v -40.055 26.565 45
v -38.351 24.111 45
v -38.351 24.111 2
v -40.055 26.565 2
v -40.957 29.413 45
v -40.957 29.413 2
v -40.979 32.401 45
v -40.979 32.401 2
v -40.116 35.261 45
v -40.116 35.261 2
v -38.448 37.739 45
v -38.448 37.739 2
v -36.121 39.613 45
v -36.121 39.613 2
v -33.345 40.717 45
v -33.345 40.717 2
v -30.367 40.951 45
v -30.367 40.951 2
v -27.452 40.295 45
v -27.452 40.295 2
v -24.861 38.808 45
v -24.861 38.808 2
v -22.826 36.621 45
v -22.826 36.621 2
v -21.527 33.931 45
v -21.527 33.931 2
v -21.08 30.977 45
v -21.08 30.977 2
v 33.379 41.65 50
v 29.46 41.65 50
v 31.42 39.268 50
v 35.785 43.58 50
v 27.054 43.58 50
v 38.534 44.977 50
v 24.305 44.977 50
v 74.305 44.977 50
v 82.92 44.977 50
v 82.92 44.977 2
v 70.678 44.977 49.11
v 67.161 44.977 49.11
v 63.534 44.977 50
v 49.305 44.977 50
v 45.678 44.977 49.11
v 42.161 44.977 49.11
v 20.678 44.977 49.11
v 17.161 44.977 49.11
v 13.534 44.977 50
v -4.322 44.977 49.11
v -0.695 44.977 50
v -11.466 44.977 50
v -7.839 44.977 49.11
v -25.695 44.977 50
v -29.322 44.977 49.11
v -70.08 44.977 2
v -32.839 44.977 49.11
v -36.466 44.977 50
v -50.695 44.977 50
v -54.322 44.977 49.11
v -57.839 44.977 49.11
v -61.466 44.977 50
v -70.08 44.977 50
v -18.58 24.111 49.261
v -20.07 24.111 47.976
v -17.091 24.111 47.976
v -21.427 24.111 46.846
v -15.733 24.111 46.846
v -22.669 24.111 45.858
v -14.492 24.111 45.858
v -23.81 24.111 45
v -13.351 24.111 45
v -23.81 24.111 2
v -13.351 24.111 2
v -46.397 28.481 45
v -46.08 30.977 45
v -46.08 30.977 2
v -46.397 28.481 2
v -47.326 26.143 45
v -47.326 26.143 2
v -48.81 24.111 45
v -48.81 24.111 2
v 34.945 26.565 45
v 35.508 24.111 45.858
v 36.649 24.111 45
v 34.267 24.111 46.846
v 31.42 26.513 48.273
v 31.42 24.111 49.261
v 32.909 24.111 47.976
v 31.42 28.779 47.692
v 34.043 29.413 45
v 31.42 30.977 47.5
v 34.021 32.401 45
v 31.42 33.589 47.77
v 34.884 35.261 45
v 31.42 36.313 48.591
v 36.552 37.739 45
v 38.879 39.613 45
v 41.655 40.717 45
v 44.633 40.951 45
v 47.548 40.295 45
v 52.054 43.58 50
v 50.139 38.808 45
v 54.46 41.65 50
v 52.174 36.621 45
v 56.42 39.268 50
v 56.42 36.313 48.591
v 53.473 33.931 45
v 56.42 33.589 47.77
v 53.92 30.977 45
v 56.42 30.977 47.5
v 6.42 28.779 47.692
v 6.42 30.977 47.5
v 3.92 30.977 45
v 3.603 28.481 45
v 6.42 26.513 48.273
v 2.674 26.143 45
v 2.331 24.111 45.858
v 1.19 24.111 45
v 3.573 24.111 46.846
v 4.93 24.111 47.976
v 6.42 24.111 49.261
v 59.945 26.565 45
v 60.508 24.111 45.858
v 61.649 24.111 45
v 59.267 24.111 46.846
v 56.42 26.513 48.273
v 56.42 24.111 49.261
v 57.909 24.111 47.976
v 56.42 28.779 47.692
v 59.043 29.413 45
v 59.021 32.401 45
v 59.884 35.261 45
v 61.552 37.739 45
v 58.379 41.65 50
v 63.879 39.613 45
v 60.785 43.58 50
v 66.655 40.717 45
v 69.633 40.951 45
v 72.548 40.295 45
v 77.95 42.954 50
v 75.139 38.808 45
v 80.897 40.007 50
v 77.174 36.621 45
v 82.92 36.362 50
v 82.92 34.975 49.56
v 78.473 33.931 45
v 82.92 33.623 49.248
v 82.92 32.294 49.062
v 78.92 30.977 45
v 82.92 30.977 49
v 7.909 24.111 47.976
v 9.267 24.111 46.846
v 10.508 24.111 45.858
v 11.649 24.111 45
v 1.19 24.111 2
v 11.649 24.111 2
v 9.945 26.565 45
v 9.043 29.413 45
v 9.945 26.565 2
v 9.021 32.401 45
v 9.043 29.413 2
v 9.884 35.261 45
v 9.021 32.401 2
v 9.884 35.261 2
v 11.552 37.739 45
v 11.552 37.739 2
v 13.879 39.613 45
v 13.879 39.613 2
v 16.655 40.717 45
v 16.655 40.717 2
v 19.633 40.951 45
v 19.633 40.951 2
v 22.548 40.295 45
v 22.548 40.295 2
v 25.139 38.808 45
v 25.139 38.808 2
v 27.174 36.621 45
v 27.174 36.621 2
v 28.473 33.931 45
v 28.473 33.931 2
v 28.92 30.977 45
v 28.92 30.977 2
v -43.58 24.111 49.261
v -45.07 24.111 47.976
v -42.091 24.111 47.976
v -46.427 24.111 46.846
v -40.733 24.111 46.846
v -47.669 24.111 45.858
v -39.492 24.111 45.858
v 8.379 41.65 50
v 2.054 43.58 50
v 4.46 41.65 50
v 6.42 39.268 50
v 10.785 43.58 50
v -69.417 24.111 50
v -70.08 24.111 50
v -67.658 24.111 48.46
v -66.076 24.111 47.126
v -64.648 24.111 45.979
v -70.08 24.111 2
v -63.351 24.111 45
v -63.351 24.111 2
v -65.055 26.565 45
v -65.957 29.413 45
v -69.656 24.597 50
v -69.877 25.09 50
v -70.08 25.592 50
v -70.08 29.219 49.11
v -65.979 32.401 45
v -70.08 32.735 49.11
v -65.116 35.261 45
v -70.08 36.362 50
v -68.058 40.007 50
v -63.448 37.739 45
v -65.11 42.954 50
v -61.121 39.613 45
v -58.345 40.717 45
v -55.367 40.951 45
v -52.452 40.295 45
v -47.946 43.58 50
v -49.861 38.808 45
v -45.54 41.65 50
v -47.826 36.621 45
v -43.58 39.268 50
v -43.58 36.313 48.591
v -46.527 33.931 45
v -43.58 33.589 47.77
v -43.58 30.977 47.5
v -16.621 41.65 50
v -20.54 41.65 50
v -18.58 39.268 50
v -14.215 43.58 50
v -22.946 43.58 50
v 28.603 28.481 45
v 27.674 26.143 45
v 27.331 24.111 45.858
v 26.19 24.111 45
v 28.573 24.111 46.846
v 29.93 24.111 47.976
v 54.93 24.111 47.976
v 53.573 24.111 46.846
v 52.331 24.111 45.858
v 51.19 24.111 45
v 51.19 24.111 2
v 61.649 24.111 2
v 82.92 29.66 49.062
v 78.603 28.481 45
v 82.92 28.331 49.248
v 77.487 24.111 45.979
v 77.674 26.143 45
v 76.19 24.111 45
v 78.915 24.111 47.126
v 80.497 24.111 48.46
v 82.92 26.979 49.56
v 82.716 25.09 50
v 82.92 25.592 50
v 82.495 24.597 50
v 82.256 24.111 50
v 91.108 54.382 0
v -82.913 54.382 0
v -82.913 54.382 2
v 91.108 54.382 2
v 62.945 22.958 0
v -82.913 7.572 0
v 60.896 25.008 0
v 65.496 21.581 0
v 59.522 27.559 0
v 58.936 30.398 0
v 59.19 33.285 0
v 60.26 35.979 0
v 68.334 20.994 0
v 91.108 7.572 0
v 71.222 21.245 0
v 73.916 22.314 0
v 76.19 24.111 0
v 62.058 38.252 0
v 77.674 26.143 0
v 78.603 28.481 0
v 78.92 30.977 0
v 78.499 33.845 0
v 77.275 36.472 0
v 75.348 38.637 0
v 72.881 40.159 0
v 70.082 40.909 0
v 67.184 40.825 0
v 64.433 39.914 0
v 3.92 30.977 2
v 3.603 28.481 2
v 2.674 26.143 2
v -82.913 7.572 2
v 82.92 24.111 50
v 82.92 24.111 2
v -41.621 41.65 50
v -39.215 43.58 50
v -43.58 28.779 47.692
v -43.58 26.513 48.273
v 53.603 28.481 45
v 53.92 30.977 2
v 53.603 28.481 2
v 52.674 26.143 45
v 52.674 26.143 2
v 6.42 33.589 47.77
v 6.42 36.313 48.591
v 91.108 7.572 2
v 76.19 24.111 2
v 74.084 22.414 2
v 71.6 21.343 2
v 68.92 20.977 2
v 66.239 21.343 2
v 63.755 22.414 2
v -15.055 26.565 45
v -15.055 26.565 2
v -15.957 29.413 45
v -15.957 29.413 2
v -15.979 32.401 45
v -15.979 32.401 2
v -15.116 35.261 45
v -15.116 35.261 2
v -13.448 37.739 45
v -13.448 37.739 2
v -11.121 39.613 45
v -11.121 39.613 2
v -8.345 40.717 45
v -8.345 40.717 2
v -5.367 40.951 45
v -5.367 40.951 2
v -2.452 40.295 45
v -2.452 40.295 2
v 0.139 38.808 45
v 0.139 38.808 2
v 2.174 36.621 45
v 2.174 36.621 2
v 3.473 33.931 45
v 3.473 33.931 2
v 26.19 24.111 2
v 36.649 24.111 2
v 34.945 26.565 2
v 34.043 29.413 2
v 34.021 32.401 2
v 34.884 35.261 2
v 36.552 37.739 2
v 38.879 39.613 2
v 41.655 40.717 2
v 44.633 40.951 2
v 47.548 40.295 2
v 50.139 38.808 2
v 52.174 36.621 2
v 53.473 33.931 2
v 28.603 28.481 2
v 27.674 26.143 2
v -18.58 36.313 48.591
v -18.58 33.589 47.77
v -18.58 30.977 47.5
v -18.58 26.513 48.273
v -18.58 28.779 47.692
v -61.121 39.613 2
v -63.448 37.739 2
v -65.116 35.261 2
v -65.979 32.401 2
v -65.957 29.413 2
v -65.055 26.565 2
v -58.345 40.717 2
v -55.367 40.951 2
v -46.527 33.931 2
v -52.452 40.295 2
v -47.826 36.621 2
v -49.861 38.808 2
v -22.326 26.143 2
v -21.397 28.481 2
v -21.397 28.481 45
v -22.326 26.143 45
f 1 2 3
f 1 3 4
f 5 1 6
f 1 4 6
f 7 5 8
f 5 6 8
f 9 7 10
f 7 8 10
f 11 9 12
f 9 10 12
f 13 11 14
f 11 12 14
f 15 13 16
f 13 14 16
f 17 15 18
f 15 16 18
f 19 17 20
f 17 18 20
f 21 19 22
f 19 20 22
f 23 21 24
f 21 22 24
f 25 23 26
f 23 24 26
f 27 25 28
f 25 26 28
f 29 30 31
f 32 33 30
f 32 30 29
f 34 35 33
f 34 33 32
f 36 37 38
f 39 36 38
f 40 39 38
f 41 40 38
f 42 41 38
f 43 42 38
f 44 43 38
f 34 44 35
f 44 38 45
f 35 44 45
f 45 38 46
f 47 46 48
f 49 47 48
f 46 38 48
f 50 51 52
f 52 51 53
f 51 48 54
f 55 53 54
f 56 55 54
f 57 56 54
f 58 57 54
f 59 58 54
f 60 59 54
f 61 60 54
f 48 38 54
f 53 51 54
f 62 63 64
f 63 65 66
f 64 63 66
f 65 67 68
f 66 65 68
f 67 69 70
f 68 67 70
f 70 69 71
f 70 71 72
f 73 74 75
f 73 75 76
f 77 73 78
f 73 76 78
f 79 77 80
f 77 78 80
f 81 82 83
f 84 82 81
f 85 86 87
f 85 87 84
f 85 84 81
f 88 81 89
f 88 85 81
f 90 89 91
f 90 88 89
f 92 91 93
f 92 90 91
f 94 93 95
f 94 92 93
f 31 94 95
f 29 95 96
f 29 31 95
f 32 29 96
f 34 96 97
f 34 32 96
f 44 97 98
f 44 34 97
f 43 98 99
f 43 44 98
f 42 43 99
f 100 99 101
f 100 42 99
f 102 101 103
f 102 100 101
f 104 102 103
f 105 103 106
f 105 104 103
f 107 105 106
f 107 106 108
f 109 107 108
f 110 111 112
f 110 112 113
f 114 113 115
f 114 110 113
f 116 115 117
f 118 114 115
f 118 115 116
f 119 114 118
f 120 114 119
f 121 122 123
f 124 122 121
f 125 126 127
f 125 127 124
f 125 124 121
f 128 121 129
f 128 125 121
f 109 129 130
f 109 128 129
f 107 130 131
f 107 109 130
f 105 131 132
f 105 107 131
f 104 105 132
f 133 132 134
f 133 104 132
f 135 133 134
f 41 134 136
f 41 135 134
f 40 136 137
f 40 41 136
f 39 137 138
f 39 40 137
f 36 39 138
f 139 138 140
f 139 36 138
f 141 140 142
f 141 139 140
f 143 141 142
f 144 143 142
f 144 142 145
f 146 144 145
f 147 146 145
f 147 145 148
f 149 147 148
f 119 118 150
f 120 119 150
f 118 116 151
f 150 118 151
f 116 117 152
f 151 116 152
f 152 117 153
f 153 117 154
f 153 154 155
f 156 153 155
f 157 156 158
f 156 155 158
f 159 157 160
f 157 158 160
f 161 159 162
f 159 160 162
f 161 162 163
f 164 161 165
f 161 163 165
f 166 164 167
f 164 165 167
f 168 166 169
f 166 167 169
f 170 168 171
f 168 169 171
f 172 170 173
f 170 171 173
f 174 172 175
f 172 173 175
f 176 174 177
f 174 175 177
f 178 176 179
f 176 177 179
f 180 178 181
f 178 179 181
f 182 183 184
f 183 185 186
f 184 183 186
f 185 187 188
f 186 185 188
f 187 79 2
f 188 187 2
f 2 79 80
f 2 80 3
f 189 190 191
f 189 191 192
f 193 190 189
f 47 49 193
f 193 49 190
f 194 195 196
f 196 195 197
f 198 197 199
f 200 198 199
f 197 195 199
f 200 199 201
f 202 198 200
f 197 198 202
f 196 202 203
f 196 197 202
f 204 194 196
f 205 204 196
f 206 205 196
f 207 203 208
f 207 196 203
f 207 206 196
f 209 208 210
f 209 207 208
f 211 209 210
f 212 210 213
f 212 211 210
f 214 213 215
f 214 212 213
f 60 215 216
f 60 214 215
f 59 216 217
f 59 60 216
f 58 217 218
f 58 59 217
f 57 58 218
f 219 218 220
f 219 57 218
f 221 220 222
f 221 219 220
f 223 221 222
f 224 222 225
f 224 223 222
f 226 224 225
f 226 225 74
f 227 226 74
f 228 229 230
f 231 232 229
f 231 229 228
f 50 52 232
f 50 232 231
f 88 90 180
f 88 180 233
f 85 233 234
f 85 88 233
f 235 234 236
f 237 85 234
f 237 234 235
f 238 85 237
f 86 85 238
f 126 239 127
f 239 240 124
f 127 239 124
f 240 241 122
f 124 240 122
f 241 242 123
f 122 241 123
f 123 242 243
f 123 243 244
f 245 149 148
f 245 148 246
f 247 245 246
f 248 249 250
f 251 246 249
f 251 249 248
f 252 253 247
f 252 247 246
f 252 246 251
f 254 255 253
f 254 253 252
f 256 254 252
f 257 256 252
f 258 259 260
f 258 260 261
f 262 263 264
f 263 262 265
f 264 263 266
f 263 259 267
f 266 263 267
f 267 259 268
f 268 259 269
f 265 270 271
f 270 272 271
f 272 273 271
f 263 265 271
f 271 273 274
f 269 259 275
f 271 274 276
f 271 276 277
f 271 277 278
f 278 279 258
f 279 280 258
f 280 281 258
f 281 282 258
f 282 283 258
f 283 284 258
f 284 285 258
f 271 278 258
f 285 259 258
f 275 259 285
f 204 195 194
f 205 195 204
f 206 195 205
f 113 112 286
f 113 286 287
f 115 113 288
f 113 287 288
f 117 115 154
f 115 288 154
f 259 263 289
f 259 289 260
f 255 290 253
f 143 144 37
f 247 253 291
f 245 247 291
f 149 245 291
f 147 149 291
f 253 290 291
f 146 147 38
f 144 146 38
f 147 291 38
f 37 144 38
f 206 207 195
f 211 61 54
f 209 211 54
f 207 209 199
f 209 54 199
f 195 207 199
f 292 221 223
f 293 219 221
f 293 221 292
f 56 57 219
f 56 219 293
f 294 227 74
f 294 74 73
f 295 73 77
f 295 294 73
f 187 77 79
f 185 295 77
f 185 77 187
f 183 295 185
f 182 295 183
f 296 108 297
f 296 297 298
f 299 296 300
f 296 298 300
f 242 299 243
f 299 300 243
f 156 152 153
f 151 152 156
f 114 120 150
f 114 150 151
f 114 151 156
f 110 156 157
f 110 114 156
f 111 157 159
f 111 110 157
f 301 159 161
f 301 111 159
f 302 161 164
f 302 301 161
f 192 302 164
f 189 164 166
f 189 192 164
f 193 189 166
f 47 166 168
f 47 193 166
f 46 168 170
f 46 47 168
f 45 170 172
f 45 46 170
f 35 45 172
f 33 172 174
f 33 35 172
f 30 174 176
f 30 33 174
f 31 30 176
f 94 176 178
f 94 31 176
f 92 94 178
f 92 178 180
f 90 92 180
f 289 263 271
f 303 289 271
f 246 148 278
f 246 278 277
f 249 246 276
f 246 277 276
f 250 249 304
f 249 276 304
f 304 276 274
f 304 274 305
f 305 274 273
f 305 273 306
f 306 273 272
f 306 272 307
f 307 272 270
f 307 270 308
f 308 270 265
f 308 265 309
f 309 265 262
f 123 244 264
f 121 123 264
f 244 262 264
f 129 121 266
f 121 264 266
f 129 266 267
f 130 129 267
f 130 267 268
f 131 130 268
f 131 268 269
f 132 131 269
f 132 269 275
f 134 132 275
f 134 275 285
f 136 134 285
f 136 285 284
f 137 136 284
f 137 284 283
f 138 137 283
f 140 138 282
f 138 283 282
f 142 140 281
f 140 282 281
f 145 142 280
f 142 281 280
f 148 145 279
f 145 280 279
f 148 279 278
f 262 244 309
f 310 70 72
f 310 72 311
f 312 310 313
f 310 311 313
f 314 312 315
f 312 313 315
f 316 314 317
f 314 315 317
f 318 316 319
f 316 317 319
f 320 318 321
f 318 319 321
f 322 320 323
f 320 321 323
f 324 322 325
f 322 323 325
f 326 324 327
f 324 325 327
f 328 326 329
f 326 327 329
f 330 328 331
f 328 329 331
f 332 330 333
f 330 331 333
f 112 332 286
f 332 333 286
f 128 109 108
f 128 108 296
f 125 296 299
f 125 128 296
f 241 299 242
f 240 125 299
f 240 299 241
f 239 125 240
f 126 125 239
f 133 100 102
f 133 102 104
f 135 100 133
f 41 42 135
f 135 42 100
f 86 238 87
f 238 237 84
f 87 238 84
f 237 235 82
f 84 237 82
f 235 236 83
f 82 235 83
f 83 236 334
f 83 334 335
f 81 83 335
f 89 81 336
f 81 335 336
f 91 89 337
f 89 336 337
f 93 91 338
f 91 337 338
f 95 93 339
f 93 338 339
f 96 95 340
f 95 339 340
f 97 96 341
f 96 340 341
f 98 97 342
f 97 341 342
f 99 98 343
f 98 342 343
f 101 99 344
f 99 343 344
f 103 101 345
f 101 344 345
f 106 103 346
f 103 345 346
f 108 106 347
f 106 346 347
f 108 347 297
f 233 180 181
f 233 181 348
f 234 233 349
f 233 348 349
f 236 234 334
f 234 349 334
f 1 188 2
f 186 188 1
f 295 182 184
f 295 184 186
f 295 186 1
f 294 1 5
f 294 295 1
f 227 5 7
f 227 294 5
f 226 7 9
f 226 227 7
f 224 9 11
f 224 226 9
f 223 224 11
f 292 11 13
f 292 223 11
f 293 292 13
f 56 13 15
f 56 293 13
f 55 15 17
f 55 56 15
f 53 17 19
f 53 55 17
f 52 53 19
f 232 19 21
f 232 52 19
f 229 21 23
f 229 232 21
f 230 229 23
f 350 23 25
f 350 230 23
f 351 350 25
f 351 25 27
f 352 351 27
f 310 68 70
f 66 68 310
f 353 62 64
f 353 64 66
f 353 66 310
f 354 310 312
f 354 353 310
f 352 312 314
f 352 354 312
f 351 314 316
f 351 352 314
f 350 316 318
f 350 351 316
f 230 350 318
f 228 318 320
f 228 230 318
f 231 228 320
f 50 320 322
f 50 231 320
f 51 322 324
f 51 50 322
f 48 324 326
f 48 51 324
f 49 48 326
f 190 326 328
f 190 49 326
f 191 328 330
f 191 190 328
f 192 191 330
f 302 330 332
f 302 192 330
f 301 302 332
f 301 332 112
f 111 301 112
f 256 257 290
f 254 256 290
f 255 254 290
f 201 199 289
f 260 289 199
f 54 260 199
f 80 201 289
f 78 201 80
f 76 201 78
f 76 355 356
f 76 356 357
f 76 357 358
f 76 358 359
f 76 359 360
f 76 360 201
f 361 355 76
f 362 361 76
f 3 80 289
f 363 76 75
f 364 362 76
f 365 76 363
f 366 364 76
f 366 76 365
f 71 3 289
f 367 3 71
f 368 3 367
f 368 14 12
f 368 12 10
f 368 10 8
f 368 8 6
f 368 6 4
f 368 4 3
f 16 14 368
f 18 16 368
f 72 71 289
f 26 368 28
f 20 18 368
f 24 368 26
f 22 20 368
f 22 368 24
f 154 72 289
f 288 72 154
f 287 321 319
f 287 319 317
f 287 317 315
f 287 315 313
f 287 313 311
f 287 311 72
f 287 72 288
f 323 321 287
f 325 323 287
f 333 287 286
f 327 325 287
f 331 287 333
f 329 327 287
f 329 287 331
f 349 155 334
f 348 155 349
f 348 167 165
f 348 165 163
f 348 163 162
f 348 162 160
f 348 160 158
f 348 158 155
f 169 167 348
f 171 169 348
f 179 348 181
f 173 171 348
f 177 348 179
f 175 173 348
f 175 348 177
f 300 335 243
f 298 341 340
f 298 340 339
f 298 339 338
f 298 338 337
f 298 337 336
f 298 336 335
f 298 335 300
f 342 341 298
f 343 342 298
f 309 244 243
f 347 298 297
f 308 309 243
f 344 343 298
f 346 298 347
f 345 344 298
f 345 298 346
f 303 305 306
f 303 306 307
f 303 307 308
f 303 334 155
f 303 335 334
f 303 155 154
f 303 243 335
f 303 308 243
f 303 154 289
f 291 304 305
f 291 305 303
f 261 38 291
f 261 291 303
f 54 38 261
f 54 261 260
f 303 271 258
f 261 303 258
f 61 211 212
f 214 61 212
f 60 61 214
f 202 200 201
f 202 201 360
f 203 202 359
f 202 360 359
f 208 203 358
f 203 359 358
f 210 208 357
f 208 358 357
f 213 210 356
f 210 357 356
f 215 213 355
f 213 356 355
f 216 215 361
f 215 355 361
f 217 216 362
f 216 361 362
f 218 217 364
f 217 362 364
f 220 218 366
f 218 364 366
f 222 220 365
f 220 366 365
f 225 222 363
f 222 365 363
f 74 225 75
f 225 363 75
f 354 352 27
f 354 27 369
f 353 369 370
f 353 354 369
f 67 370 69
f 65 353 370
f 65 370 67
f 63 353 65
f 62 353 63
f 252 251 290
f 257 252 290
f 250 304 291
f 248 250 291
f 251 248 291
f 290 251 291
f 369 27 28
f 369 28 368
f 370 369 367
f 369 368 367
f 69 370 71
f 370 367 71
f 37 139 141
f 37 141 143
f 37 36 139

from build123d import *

# Parameters (mm, degrees)
F1_DEPTH     = 50
F0_W         = 174.0209832788
F0_H         = 46.8094409443
F2_DEPTH     = 2
F3_T2_ANGLE  = 297.2148412711
F3_T4_ANGLE  = 297.2148412711
F3_T6_ANGLE  = 297.2148412711
F3_T8_ANGLE  = 297.2148412711
F3_T10_ANGLE = 297.2148412711
F3_T12_ANGLE = 297.2148412711
F3_T14_ANGLE = 117.0391625113
F3_T16_ANGLE = 117.0391625113
F3_T18_ANGLE = 117.0391625113
F3_T20_ANGLE = 117.0391625113
F3_T22_ANGLE = 117.0391625113
F3_T24_ANGLE = 117.0391625113


# Not quite as in the source:
# - a fillet or chamfer that OpenCascade refuses, or shapes differently, is made with other operations: its cross-section is extruded or revolved along the edge and cut away or added


with BuildPart() as f1:
    # F0 (on Top) → F1 (new body)
    with BuildSketch(Plane.XY):
        with BuildLine():
            ThreePointArc((-63.3511276029, 24.1111628711), (-59.7746098829, 40.2694854105), (-46.0804665685, 30.9768375009))
            ThreePointArc((-46.0804665685, 30.9768375009), (-46.7878186589, 27.2826941865), (-48.809805534, 24.1111628711))
            Line((-48.809805534, 24.1111628711), (-38.3511276029, 24.1111628711))
            ThreePointArc((-38.3511276029, 24.1111628711), (-34.7746098829, 40.2694854105), (-21.0804665685, 30.9768375009))
            ThreePointArc((-21.0804665685, 30.9768375009), (-21.7878186589, 27.2826941865), (-23.809805534, 24.1111628711))
            Line((-23.809805534, 24.1111628711), (-13.3511276029, 24.1111628711))
            ThreePointArc((-13.3511276029, 24.1111628711), (-9.7746098829, 40.2694854105), (3.9195334315, 30.9768375009))
            ThreePointArc((3.9195334315, 30.9768375009), (3.2121813411, 27.2826941865), (1.190194466, 24.1111628711))
            Line((1.190194466, 24.1111628711), (11.6488723971, 24.1111628711))
            ThreePointArc((11.6488723971, 24.1111628711), (15.2253901171, 40.2694854105), (28.9195334315, 30.9768375009))
            ThreePointArc((28.9195334315, 30.9768375009), (28.2121813411, 27.2826941865), (26.190194466, 24.1111628711))
            Line((26.190194466, 24.1111628711), (36.6488723971, 24.1111628711))
            ThreePointArc((36.6488723971, 24.1111628711), (40.2253901171, 40.2694854105), (53.9195334315, 30.9768375009))
            ThreePointArc((53.9195334315, 30.9768375009), (53.2121813411, 27.2826941865), (51.190194466, 24.1111628711))
            Line((51.190194466, 24.1111628711), (61.6488723971, 24.1111628711))
            ThreePointArc((61.6488723971, 24.1111628711), (65.2253901171, 40.2694854105), (78.9195334315, 30.9768375009))
            ThreePointArc((78.9195334315, 30.9768375009), (78.2121813411, 27.2826941865), (76.190194466, 24.1111628711))
            Line((76.190194466, 24.1111628711), (82.9195334315, 24.1111628711))
            Line((82.9195334315, 24.1111628711), (82.9195334315, 44.9768375009))
            Line((82.9195334315, 44.9768375009), (-70.0804665685, 44.9768375009))
            Line((-70.0804665685, 44.9768375009), (-70.0804665685, 24.1111628711))
            Line((-70.0804665685, 24.1111628711), (-63.3511276029, 24.1111628711))
        make_face()
    extrude(amount=F1_DEPTH)

    # F0 (on Top) → F2 (join)
    with BuildSketch(Plane.XY):
        with Locations((4.097443074, 30.9768363368)):
            Rectangle(F0_W, F0_H)
        Polygon((-70.0804665685, 16.9768375009), (-70.0804665685, 24.1111628711), (-70.0804665685, 44.9768375009), (82.9195334315, 44.9768375009), (82.9195334315, 24.1111628711), (82.9195334315, 16.9768375009), align=None, mode=Mode.SUBTRACT)
        with BuildLine():
            ThreePointArc((-48.809805534, 24.1111628711), (-56.0804665685, 20.9768375009), (-63.3511276029, 24.1111628711))
            Line((-63.3511276029, 24.1111628711), (-70.0804665685, 24.1111628711))
            Line((-70.0804665685, 24.1111628711), (-70.0804665685, 16.9768375009))
            Line((-70.0804665685, 16.9768375009), (82.9195334315, 16.9768375009))
            Line((82.9195334315, 16.9768375009), (82.9195334315, 24.1111628711))
            Line((82.9195334315, 24.1111628711), (76.190194466, 24.1111628711))
            ThreePointArc((76.190194466, 24.1111628711), (68.9195334315, 20.9768375009), (61.6488723971, 24.1111628711))
            Line((61.6488723971, 24.1111628711), (51.190194466, 24.1111628711))
            ThreePointArc((51.190194466, 24.1111628711), (43.9195334315, 20.9768375009), (36.6488723971, 24.1111628711))
            Line((36.6488723971, 24.1111628711), (26.190194466, 24.1111628711))
            ThreePointArc((26.190194466, 24.1111628711), (18.9195334315, 20.9768375009), (11.6488723971, 24.1111628711))
            Line((11.6488723971, 24.1111628711), (1.190194466, 24.1111628711))
            ThreePointArc((1.190194466, 24.1111628711), (-6.0804665685, 20.9768375009), (-13.3511276029, 24.1111628711))
            Line((-13.3511276029, 24.1111628711), (-23.809805534, 24.1111628711))
            ThreePointArc((-23.809805534, 24.1111628711), (-31.0804665685, 20.9768375009), (-38.3511276029, 24.1111628711))
            Line((-38.3511276029, 24.1111628711), (-48.809805534, 24.1111628711))
        make_face()
        with BuildLine():
            ThreePointArc((-48.809805534, 24.1111628711), (-46.7878186589, 27.2826941865), (-46.0804665685, 30.9768375009))
            ThreePointArc((-46.0804665685, 30.9768375009), (-59.7746098829, 40.2694854105), (-63.3511276029, 24.1111628711))
            Line((-63.3511276029, 24.1111628711), (-48.809805534, 24.1111628711))
        make_face()
        with BuildLine():
            Line((-48.809805534, 24.1111628711), (-63.3511276029, 24.1111628711))
            ThreePointArc((-63.3511276029, 24.1111628711), (-56.0804665685, 20.9768375009), (-48.809805534, 24.1111628711))
        make_face()
        with BuildLine():
            ThreePointArc((-21.0804665685, 30.9768375009), (-34.7746098829, 40.2694854105), (-38.3511276029, 24.1111628711))
            Line((-38.3511276029, 24.1111628711), (-23.809805534, 24.1111628711))
            ThreePointArc((-23.809805534, 24.1111628711), (-21.7878186589, 27.2826941865), (-21.0804665685, 30.9768375009))
        make_face()
        with BuildLine():
            Line((-23.809805534, 24.1111628711), (-38.3511276029, 24.1111628711))
            ThreePointArc((-38.3511276029, 24.1111628711), (-31.0804665685, 20.9768375009), (-23.809805534, 24.1111628711))
        make_face()
        with BuildLine():
            ThreePointArc((3.9195334315, 30.9768375009), (-9.7746098829, 40.2694854105), (-13.3511276029, 24.1111628711))
            Line((-13.3511276029, 24.1111628711), (1.190194466, 24.1111628711))
            ThreePointArc((1.190194466, 24.1111628711), (3.2121813411, 27.2826941865), (3.9195334315, 30.9768375009))
        make_face()
        with BuildLine():
            Line((1.190194466, 24.1111628711), (-13.3511276029, 24.1111628711))
            ThreePointArc((-13.3511276029, 24.1111628711), (-6.0804665685, 20.9768375009), (1.190194466, 24.1111628711))
        make_face()
        with BuildLine():
            ThreePointArc((28.9195334315, 30.9768375009), (15.2253901171, 40.2694854105), (11.6488723971, 24.1111628711))
            Line((11.6488723971, 24.1111628711), (26.190194466, 24.1111628711))
            ThreePointArc((26.190194466, 24.1111628711), (28.2121813411, 27.2826941865), (28.9195334315, 30.9768375009))
        make_face()
        with BuildLine():
            Line((26.190194466, 24.1111628711), (11.6488723971, 24.1111628711))
            ThreePointArc((11.6488723971, 24.1111628711), (18.9195334315, 20.9768375009), (26.190194466, 24.1111628711))
        make_face()
        with BuildLine():
            Line((36.6488723971, 24.1111628711), (51.190194466, 24.1111628711))
            ThreePointArc((51.190194466, 24.1111628711), (53.2121813411, 27.2826941865), (53.9195334315, 30.9768375009))
            ThreePointArc((53.9195334315, 30.9768375009), (40.2253901171, 40.2694854105), (36.6488723971, 24.1111628711))
        make_face()
        with BuildLine():
            ThreePointArc((36.6488723971, 24.1111628711), (43.9195334315, 20.9768375009), (51.190194466, 24.1111628711))
            Line((51.190194466, 24.1111628711), (36.6488723971, 24.1111628711))
        make_face()
    extrude(amount=F2_DEPTH)

    # F3: chamfer of 5 on 6 edges, made by hand

    # F3_s1 → F3_t2 (revolve, cut)
    with BuildSketch(Plane(origin=(-31.7529692139, -16.3292082814, 0), x_dir=(0, 0, 1), z_dir=(0.8892979418, 0.4573282964, 0))):
        Polygon((45, -43.1948220704), (50, -38.1948220704), (50, -43.1948220704), align=None)
    revolve(axis=Axis((-56.0804665685, 30.9768375009, 50), (0, 0, -1)), revolution_arc=F3_T2_ANGLE, mode=Mode.SUBTRACT)

    # F3_s3 → F3_t4 (revolve, cut)
    with BuildSketch(Plane(origin=(-11.981698481, -6.1616804635, 0), x_dir=(0, 0, 1), z_dir=(0.8892979418, 0.4573282964, 0))):
        Polygon((45, -31.7616146605), (50, -26.7616146605), (50, -31.7616146605), align=None)
    revolve(axis=Axis((-31.0804665685, 30.9768375009, 50), (0, 0, -1)), revolution_arc=F3_T4_ANGLE, mode=Mode.SUBTRACT)

    # F3_s5 → F3_t6 (revolve, cut)
    with BuildSketch(Plane(origin=(7.7895722518, 4.0058473545, 0), x_dir=(0, 0, 1), z_dir=(0.8892979418, 0.4573282964, 0))):
        Polygon((45, -20.3284072505), (50, -15.3284072505), (50, -20.3284072505), align=None)
    revolve(axis=Axis((-6.0804665685, 30.9768375009, 50), (0, 0, -1)), revolution_arc=F3_T6_ANGLE, mode=Mode.SUBTRACT)

    # F3_s7 → F3_t8 (revolve, cut)
    with BuildSketch(Plane(origin=(27.5608429847, 14.1733751725, 0), x_dir=(0, 0, 1), z_dir=(0.8892979418, 0.4573282964, 0))):
        Polygon((45, -8.8951998406), (50, -3.8951998406), (50, -8.8951998406), align=None)
    revolve(axis=Axis((18.9195334315, 30.9768375009, 50), (0, 0, -1)), revolution_arc=F3_T8_ANGLE, mode=Mode.SUBTRACT)

    # F3_s9 → F3_t10 (revolve, cut)
    with BuildSketch(Plane(origin=(47.3321137176, 24.3409029904, 0), x_dir=(0, 0, 1), z_dir=(0.8892979418, 0.4573282964, 0))):
        Polygon((45, 2.5380075693), (50, 7.5380075693), (50, 2.5380075693), align=None)
    revolve(axis=Axis((43.9195334315, 30.9768375009, 50), (0, 0, -1)), revolution_arc=F3_T10_ANGLE, mode=Mode.SUBTRACT)

    # F3_s11 → F3_t12 (revolve, cut)
    with BuildSketch(Plane(origin=(67.1033844505, 34.5084308084, 0), x_dir=(0, 0, 1), z_dir=(0.8892979418, 0.4573282964, 0))):
        Polygon((45, 13.9712149792), (50, 18.9712149792), (50, 13.9712149792), align=None)
    revolve(axis=Axis((68.9195334315, 30.9768375009, 50), (0, 0, -1)), revolution_arc=F3_T12_ANGLE, mode=Mode.SUBTRACT)

    # F3_s13 → F3_t14 (revolve, cut)
    with BuildSketch(Plane.XZ.offset(-30.9768375009)):
        Polygon((78.9195334315, 45), (83.9195334315, 50), (78.9195334315, 50), align=None)
    revolve(axis=Axis((68.9195334315, 30.9768375009, 50), (0, 0, -1)), revolution_arc=F3_T14_ANGLE, mode=Mode.SUBTRACT)

    # F3_s15 → F3_t16 (revolve, cut)
    with BuildSketch(Plane.XZ.offset(-30.9768375009)):
        Polygon((53.9195334315, 45), (58.9195334315, 50), (53.9195334315, 50), align=None)
    revolve(axis=Axis((43.9195334315, 30.9768375009, 50), (0, 0, -1)), revolution_arc=F3_T16_ANGLE, mode=Mode.SUBTRACT)

    # F3_s17 → F3_t18 (revolve, cut)
    with BuildSketch(Plane.XZ.offset(-30.9768375009)):
        Polygon((28.9195334315, 45), (33.9195334315, 50), (28.9195334315, 50), align=None)
    revolve(axis=Axis((18.9195334315, 30.9768375009, 50), (0, 0, -1)), revolution_arc=F3_T18_ANGLE, mode=Mode.SUBTRACT)

    # F3_s19 → F3_t20 (revolve, cut)
    with BuildSketch(Plane.XZ.offset(-30.9768375009)):
        Polygon((3.9195334315, 45), (8.9195334315, 50), (3.9195334315, 50), align=None)
    revolve(axis=Axis((-6.0804665685, 30.9768375009, 50), (0, 0, -1)), revolution_arc=F3_T20_ANGLE, mode=Mode.SUBTRACT)

    # F3_s21 → F3_t22 (revolve, cut)
    with BuildSketch(Plane.XZ.offset(-30.9768375009)):
        Polygon((-21.0804665685, 45), (-16.0804665685, 50), (-21.0804665685, 50), align=None)
    revolve(axis=Axis((-31.0804665685, 30.9768375009, 50), (0, 0, -1)), revolution_arc=F3_T22_ANGLE, mode=Mode.SUBTRACT)

    # F3_s23 → F3_t24 (revolve, cut)
    with BuildSketch(Plane.XZ.offset(-30.9768375009)):
        Polygon((-46.0804665685, 45), (-41.0804665685, 50), (-46.0804665685, 50), align=None)
    revolve(axis=Axis((-56.0804665685, 30.9768375009, 50), (0, 0, -1)), revolution_arc=F3_T24_ANGLE, mode=Mode.SUBTRACT)


solid = f1.part
